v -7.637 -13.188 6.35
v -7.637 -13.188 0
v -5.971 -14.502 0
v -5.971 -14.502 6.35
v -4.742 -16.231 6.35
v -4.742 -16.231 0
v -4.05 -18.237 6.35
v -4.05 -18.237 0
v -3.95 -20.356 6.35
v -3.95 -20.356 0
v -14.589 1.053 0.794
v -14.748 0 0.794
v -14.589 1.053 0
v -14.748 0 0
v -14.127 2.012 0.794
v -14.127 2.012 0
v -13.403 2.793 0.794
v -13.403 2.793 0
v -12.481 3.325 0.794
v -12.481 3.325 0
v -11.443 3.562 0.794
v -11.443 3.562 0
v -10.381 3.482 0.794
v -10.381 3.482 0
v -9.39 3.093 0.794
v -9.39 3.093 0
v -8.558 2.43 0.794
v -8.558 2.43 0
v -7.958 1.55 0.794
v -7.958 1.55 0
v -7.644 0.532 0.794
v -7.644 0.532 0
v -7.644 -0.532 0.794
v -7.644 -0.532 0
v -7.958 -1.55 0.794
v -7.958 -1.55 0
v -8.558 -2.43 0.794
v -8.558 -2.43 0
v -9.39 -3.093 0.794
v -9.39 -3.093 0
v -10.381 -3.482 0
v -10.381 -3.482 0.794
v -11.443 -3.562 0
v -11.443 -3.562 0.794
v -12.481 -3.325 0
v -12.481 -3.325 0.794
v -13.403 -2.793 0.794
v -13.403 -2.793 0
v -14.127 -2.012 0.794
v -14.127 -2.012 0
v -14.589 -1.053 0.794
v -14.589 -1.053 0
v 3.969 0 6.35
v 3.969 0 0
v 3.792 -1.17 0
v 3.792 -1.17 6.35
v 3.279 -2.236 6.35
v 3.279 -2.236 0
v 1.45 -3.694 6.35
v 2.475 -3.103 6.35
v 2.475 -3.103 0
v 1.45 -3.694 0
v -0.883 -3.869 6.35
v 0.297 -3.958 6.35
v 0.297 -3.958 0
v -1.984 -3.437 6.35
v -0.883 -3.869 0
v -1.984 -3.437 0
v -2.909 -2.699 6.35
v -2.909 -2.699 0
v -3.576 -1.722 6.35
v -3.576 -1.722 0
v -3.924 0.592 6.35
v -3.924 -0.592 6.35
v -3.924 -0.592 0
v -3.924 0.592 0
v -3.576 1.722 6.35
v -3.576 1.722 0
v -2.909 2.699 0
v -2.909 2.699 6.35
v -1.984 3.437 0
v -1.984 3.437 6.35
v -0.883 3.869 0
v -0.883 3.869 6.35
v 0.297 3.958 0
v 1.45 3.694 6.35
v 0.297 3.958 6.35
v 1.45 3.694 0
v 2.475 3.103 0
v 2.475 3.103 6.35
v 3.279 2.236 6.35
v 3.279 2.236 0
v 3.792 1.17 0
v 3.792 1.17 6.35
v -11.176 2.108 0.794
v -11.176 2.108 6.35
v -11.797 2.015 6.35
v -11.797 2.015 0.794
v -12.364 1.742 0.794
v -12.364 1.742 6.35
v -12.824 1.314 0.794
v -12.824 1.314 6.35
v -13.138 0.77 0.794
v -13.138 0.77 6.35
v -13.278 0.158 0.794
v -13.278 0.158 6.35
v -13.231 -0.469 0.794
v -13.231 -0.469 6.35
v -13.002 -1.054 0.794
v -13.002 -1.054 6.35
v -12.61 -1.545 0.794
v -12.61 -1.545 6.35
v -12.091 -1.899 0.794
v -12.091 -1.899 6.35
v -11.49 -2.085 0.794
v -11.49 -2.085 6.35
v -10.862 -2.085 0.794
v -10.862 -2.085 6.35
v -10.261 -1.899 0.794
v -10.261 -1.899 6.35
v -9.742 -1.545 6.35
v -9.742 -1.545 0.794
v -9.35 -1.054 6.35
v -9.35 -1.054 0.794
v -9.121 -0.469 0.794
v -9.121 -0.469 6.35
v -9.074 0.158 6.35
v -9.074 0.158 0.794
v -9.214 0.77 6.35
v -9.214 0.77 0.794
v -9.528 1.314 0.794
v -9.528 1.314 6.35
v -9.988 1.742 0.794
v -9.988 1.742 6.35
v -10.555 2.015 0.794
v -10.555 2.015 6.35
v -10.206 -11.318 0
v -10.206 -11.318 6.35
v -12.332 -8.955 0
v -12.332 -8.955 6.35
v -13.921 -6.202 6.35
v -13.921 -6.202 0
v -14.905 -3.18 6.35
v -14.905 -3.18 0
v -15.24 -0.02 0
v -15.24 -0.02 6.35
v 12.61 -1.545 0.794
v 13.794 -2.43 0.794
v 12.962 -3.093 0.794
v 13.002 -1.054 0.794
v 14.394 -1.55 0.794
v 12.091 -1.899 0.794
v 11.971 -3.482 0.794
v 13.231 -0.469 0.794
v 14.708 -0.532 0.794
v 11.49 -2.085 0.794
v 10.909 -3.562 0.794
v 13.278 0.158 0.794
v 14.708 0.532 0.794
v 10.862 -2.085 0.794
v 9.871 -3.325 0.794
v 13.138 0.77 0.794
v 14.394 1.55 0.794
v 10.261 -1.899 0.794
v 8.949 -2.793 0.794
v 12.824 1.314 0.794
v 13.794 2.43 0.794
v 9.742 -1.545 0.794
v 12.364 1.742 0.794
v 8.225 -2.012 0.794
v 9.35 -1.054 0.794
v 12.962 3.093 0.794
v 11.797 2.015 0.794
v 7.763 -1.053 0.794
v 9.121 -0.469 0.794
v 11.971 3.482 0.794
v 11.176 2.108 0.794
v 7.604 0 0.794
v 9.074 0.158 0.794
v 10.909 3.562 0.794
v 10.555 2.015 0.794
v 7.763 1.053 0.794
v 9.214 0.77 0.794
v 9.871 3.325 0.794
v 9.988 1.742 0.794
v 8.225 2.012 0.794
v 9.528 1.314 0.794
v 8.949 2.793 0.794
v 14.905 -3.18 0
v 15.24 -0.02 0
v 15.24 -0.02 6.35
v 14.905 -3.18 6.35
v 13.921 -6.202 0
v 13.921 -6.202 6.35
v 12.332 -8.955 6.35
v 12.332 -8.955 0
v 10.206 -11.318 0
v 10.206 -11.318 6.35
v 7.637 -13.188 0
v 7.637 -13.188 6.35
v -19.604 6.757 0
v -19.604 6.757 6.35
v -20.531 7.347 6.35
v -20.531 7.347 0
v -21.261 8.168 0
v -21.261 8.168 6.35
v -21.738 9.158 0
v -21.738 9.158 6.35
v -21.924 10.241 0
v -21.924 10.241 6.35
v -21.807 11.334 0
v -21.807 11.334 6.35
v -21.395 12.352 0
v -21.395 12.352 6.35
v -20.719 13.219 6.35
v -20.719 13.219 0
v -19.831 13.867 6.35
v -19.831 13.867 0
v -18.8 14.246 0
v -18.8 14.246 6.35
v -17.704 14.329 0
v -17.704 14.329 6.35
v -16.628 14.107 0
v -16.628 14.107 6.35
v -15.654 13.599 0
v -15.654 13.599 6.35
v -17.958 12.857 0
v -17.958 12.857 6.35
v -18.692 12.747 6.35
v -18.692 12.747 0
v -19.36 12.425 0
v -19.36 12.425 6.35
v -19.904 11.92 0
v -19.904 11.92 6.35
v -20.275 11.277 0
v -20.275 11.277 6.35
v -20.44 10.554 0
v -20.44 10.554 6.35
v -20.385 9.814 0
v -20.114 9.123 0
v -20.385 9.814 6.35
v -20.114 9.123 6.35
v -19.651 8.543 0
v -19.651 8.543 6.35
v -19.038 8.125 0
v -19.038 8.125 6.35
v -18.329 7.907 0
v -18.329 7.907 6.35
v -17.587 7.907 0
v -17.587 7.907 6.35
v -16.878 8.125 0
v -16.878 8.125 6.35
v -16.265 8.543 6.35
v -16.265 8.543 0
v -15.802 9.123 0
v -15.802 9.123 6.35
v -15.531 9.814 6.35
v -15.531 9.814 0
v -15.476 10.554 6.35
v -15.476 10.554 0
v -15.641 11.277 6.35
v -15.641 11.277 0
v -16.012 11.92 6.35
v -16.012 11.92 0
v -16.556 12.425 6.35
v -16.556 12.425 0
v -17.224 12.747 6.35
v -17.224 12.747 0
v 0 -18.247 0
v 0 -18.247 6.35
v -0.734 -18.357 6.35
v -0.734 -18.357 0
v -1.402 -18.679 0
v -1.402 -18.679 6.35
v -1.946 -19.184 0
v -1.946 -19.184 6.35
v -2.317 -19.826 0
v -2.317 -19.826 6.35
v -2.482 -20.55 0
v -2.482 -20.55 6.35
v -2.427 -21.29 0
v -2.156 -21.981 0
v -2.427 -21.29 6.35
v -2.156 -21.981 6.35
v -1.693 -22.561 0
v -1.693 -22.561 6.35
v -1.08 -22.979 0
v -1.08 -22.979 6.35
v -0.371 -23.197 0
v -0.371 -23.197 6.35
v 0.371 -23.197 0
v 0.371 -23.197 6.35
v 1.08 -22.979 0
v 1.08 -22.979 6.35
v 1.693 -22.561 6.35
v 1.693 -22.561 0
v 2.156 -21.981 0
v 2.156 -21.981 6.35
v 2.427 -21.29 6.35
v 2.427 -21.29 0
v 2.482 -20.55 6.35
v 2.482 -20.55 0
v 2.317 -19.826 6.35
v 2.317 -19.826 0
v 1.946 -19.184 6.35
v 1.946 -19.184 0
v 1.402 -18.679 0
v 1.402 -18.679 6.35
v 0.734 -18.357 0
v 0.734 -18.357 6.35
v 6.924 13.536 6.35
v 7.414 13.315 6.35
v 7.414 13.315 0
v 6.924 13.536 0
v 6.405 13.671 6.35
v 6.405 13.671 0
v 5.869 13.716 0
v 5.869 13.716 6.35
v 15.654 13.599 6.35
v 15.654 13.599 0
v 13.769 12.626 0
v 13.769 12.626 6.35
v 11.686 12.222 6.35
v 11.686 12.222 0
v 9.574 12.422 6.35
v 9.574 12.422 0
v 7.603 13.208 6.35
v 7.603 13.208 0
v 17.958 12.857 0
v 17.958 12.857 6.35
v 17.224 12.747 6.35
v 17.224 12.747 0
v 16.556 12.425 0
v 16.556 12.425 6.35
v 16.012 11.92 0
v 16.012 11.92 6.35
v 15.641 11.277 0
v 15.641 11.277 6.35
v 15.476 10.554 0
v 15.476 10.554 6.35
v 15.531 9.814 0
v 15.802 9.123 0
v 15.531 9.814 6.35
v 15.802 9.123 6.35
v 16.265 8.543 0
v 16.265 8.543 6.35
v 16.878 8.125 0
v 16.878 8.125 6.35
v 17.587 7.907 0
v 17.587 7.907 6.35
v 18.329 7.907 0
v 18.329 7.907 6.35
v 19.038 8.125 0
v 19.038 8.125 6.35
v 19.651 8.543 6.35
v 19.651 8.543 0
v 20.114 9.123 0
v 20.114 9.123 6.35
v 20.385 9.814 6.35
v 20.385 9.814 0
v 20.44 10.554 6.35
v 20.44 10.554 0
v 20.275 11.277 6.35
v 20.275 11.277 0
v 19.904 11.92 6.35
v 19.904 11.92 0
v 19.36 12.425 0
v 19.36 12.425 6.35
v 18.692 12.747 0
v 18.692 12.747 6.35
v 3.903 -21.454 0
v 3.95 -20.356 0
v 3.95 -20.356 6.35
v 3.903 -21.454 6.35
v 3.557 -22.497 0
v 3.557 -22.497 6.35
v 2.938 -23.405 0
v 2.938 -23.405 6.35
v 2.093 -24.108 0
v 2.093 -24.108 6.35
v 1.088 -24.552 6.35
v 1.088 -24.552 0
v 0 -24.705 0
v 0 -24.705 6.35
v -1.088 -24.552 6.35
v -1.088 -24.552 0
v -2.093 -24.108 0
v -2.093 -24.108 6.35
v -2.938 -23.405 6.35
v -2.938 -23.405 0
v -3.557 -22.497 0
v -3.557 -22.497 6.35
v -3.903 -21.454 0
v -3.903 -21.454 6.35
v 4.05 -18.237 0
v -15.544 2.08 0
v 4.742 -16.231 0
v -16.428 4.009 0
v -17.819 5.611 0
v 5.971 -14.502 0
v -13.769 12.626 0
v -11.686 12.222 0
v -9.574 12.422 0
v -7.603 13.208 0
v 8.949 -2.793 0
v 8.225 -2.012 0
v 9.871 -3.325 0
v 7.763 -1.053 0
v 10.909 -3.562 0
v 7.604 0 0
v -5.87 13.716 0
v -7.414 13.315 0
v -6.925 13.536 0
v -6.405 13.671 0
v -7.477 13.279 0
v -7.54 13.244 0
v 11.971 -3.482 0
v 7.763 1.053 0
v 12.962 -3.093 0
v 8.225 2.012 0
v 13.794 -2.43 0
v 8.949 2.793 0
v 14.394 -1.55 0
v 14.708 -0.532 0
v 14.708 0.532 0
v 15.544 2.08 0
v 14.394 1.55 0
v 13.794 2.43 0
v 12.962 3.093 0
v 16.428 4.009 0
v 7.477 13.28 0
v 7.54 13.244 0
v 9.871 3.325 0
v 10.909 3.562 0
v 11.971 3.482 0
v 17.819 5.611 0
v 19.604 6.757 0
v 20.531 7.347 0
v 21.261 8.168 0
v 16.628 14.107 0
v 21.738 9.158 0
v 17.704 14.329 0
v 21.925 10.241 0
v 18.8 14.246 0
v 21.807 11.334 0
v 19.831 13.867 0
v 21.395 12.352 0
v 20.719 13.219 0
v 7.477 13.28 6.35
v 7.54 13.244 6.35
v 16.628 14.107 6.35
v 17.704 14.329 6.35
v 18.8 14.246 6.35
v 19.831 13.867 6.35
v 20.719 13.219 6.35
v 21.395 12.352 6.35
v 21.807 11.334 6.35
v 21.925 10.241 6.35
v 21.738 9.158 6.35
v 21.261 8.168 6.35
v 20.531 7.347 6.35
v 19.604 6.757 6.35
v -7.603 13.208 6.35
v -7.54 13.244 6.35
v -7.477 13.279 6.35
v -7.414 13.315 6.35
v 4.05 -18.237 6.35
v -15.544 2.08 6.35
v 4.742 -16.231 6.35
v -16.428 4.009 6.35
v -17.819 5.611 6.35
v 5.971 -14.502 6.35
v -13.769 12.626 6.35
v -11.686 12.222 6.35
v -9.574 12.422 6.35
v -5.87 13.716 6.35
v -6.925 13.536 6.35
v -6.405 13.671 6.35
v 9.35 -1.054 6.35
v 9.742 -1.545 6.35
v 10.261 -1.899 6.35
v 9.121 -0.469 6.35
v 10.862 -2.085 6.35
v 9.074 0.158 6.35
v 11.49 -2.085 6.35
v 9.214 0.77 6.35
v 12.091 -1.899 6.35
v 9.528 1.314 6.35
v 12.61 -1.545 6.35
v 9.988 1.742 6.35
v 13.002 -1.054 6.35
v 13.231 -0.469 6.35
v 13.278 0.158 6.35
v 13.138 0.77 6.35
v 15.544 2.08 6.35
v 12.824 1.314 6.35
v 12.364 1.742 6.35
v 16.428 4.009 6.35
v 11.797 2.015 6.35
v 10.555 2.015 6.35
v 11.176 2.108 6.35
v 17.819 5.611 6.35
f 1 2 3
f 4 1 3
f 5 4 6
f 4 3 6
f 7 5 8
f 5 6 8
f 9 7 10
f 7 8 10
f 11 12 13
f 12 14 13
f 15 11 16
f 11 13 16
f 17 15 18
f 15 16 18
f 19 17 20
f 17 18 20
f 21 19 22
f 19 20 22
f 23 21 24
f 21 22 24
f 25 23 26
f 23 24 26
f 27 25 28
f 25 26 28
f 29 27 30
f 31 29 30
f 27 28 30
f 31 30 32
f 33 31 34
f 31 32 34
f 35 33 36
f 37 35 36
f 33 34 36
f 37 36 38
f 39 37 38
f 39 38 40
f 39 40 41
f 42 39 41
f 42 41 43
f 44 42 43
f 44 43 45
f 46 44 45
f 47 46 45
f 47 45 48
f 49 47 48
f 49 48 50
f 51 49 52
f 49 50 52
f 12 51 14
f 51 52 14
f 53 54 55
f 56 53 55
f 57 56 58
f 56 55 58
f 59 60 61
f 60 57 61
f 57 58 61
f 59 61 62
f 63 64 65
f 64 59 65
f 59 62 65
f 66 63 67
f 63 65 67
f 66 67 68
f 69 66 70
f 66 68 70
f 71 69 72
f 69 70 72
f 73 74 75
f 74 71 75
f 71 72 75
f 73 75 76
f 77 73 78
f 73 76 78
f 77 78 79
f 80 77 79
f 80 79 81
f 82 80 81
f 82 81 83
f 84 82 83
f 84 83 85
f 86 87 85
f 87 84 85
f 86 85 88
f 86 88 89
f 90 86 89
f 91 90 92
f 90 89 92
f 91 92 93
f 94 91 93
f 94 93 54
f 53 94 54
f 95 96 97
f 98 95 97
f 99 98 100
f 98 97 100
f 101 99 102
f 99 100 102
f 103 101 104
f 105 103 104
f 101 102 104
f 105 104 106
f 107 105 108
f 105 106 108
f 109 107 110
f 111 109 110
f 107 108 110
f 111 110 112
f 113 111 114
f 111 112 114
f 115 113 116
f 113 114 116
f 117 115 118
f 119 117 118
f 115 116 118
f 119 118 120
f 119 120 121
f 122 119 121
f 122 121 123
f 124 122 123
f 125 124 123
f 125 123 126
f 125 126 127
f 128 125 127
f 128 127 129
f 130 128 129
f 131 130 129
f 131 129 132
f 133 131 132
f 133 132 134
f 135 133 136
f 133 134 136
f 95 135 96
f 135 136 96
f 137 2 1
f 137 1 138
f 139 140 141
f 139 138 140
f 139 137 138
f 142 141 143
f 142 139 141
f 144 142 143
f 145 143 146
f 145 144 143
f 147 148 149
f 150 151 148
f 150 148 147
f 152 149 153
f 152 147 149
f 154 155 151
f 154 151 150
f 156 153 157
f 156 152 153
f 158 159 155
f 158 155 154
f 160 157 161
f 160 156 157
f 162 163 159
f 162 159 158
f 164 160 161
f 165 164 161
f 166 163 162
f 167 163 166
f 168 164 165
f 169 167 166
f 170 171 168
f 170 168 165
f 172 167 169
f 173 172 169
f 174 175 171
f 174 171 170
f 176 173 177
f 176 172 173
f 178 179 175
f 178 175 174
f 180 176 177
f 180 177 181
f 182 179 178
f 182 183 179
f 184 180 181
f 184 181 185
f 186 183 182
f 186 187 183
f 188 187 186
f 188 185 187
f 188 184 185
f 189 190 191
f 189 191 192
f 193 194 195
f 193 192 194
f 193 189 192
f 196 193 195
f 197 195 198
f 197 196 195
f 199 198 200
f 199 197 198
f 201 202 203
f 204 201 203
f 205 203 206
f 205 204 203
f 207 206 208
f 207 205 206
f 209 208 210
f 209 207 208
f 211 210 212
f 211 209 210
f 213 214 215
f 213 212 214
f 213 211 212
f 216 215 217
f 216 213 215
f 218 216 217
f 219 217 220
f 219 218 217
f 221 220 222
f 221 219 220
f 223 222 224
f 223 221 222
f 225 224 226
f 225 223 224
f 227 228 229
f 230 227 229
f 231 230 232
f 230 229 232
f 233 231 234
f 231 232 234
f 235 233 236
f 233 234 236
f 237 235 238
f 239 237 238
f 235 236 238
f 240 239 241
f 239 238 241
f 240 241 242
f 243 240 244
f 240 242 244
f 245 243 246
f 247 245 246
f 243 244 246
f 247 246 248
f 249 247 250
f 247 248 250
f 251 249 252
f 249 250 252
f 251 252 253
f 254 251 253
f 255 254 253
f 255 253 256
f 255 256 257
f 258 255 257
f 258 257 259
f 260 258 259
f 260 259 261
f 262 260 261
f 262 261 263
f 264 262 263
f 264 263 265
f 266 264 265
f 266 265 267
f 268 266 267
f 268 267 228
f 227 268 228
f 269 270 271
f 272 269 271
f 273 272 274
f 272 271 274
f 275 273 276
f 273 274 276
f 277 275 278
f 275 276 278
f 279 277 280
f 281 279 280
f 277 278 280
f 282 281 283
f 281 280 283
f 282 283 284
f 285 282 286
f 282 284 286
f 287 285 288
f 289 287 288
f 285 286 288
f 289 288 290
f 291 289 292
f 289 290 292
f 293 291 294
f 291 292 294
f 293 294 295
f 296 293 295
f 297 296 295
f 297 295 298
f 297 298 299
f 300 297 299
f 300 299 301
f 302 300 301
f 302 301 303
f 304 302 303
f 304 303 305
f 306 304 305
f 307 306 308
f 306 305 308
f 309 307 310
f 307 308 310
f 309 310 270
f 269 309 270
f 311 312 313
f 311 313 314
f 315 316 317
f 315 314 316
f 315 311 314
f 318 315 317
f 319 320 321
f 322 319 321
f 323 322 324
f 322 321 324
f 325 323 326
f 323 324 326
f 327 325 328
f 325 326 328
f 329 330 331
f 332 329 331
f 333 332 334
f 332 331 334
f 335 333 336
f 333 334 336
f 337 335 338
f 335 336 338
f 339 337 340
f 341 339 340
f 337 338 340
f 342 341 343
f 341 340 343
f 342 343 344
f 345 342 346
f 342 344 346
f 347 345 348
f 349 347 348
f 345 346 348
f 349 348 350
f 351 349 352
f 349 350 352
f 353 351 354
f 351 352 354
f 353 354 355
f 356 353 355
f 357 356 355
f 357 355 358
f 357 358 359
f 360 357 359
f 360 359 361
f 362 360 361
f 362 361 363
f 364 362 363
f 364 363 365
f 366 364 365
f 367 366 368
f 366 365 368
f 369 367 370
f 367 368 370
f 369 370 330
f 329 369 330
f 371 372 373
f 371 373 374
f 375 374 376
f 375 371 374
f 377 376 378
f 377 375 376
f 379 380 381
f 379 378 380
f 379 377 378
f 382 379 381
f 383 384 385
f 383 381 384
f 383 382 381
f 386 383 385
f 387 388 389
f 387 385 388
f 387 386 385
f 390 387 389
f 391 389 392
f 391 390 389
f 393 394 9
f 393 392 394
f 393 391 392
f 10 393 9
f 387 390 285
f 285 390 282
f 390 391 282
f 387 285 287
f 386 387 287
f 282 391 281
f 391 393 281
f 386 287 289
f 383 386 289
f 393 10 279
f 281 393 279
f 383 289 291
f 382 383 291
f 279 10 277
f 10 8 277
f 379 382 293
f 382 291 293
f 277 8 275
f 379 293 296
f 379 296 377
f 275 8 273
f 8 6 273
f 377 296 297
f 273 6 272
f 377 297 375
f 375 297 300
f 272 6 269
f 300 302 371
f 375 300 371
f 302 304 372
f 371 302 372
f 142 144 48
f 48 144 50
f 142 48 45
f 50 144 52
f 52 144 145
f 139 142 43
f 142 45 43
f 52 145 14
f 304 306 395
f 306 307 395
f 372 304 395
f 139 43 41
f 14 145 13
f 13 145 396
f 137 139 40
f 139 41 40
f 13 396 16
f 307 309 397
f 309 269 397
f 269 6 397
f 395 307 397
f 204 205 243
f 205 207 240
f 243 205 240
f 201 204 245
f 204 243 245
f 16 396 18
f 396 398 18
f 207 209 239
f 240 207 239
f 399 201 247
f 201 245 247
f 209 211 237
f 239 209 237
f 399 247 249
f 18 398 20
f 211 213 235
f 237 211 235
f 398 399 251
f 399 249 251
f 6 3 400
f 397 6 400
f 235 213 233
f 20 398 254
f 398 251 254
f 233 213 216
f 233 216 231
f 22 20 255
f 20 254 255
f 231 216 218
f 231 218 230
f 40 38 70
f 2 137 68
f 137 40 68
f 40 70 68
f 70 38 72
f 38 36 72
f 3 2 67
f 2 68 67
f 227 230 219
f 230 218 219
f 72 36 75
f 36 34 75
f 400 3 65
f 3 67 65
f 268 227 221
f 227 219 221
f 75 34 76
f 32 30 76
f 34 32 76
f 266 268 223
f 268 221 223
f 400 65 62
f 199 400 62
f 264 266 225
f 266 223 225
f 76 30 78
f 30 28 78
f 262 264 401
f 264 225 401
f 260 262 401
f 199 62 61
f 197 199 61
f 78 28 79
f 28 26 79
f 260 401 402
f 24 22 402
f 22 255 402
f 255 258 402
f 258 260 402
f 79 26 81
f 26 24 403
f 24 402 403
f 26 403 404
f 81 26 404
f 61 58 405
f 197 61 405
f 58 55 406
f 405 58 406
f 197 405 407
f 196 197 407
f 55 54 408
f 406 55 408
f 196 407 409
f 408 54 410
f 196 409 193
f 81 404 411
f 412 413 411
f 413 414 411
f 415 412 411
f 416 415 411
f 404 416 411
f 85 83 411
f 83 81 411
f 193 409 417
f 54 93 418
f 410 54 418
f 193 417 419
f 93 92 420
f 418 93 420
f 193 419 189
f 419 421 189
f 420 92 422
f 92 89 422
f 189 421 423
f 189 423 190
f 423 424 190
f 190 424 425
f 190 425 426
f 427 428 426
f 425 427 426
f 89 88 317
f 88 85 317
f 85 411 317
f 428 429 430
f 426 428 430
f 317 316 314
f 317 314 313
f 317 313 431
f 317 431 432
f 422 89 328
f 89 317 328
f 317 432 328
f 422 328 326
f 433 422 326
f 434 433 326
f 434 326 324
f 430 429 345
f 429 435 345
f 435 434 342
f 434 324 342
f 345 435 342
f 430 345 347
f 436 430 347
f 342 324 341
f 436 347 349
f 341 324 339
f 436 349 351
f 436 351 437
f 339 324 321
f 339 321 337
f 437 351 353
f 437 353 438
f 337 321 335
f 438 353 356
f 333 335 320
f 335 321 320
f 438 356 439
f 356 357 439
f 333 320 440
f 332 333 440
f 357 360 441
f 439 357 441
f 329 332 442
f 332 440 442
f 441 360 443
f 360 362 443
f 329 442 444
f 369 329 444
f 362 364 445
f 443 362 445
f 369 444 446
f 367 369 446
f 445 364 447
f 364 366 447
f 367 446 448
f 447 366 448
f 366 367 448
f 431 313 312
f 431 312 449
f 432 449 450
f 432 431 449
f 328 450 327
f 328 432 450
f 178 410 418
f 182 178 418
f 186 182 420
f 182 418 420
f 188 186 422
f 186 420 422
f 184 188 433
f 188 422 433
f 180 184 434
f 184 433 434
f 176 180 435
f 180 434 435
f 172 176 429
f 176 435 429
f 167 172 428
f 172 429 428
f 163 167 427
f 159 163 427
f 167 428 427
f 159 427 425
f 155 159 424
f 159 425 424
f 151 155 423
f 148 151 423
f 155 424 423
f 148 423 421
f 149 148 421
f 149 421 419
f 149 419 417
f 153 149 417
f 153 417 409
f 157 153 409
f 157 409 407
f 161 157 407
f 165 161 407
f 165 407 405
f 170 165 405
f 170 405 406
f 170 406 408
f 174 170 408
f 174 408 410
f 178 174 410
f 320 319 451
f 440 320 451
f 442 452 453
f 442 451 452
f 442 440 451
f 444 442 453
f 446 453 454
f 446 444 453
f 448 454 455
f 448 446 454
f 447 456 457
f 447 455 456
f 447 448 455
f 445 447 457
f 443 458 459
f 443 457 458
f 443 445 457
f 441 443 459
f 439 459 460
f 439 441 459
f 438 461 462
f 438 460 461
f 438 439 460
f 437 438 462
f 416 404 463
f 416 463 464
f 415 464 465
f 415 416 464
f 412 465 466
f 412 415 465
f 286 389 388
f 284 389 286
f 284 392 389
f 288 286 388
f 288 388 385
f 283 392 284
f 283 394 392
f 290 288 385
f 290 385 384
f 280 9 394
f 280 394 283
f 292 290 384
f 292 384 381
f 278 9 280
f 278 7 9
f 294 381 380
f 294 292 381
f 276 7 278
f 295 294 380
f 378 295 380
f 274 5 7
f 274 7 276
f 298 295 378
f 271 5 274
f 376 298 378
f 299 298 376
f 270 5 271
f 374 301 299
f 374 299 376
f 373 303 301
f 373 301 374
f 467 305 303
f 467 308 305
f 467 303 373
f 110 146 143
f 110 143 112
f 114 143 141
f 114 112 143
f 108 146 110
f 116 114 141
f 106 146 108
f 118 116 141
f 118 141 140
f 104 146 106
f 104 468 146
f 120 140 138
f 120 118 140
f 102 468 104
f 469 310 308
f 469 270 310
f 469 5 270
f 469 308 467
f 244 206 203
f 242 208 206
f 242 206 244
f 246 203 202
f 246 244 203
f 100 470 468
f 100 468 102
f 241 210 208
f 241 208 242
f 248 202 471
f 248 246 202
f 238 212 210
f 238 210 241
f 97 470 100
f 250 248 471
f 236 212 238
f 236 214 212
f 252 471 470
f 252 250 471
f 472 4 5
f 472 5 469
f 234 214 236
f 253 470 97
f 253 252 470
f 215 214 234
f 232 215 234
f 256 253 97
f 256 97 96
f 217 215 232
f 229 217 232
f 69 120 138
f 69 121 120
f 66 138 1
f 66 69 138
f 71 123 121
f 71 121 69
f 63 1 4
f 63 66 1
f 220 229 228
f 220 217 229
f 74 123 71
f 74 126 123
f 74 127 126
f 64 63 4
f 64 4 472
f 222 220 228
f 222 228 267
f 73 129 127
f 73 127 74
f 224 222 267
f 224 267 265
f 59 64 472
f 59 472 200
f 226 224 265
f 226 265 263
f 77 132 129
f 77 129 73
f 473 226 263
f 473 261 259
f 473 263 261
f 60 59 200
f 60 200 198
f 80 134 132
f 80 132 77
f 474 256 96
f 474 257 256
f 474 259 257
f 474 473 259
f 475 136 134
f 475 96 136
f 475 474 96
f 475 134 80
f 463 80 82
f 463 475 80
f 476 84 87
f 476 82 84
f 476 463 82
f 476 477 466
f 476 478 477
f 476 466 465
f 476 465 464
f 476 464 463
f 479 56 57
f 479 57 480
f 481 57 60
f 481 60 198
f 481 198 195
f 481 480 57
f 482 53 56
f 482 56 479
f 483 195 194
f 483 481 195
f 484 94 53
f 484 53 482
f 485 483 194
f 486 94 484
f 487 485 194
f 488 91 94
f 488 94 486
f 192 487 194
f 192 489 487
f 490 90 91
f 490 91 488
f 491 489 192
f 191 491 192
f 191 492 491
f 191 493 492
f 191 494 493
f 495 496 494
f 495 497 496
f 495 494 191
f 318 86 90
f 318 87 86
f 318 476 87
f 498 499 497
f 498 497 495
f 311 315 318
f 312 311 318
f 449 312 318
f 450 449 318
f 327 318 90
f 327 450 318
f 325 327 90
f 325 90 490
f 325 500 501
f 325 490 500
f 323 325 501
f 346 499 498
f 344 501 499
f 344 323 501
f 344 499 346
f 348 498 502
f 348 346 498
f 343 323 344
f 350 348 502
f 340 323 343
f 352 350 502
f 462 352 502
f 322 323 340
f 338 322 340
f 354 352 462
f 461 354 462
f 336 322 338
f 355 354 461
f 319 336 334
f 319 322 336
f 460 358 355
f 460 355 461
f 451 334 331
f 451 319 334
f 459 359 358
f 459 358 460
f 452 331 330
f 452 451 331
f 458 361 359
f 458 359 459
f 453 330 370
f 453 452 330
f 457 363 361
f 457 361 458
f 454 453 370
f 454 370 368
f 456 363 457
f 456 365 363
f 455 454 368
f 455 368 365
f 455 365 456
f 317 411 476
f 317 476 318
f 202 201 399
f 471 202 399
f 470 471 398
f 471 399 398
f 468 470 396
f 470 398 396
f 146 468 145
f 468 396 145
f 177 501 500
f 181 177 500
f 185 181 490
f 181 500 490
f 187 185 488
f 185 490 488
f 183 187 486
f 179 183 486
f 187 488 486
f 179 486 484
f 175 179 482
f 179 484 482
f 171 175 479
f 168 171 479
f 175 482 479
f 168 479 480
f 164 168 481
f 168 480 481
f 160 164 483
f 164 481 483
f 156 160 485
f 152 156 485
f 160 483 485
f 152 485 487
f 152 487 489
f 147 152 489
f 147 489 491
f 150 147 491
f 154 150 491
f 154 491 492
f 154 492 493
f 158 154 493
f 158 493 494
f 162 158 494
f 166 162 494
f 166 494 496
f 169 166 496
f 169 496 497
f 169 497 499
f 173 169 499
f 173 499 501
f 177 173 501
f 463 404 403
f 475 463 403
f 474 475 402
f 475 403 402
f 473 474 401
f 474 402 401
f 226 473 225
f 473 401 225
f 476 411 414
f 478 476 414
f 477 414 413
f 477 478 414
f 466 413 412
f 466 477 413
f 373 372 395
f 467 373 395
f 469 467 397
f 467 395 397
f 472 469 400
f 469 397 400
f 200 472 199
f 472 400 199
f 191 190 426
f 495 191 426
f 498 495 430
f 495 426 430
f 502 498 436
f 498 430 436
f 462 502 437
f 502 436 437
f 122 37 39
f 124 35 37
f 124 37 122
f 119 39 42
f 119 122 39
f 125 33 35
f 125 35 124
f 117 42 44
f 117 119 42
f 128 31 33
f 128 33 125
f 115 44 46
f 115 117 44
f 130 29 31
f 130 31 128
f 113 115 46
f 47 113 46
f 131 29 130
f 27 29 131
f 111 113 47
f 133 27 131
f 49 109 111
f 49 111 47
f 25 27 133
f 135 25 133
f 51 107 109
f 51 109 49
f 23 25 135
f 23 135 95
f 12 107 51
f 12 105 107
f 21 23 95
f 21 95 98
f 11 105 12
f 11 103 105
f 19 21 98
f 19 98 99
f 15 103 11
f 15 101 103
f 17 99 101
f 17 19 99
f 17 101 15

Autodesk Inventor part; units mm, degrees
ref_plane "YZ Plane" through (0, 0, 0) normal (1, 0, 0) x (0, 1, 0)
ref_plane "XZ Plane" through (0, 0, 0) normal (0, 1, 0) x (-1, 0, 0)
ref_plane "XY Plane" through (0, 0, 0) normal (0, 0, 1) x (1, 0, 0)
sketch "Sketch1" plane through (0, 0, 0) normal (0, 0, 1) x (1, 0, 0)
  circle A0 centre (0, 0) radius 20.7359 construction
  line L0 (0, 0) -> (-17.9578, 10.368) construction
  arc A1 (-19.6042, 6.7568) -> (-15.6537, 13.5993) centre (-17.9578, 10.368) ccw construction
  arc A2 (-7.603, 13.208) -> (-15.24, -0.0196) centre (0, 0) ccw construction
  arc A3 (-15.24, -0.0196) -> (-19.6042, 6.7568) centre (-22.698, -0.0292) ccw
  arc A4 (-15.6537, 13.5993) -> (-7.603, 13.208) centre (-11.3237, 19.6716) ccw
  line L1 (0, 0) -> (-20.7359, 0) construction
  arc A5 (-15.6537, 13.5993) -> (-19.6042, 6.7568) centre (-17.9578, 10.368) ccw
  arc A6 (-15.24, -0.0196) -> (-7.637, -13.1884) centre (0, 0) ccw
  arc A7 (7.637, -13.1884) -> (3.9505, -20.3561) centre (11.3743, -19.6424) ccw
  arc A8 (-3.9505, -20.3561) -> (-7.637, -13.1884) centre (-11.3743, -19.6424) ccw
  arc A9 (-3.9505, -20.3561) -> (3.9505, -20.3561) centre (0, -20.7359) ccw
  arc A10 (7.603, 13.208) -> (15.6537, 13.5993) centre (11.3237, 19.6716) ccw
  arc A11 (19.6042, 6.7568) -> (15.24, -0.0196) centre (22.698, -0.0292) ccw
  arc A12 (19.6042, 6.7568) -> (15.6537, 13.5993) centre (17.9578, 10.368) ccw
  arc A13 (7.603, 13.208) -> (6.643, 13.716) centre (0, 0) ccw
  arc A14 (7.637, -13.1884) -> (15.24, -0.0196) centre (0, 0) ccw
  arc A15 (-7.637, -13.1884) -> (7.637, -13.1884) centre (0, 0) ccw construction
  arc A16 (15.24, -0.0196) -> (7.603, 13.208) centre (0, 0) ccw construction
  circle A17 centre (0, 0) radius 3.9688
  circle A18 centre (0, 0) radius 11.176 construction
  line L2 (0, -20.7359) -> (0, 0) construction
  line L3 (0, 0) -> (11.176, 0) construction
  line L4 (-6.643, 13.716) -> (6.643, 13.716)
  arc A19 (-6.643, 13.716) -> (-7.603, 13.208) centre (0, 0) ccw
  arc A20 (6.643, 13.716) -> (-6.643, 13.716) centre (0, 0) ccw construction
  point P0 (-11.176, 0)
  dimension "d0" = 41.4719
  dimension "d3" = 7.9375
  dimension "d5" = 30
  dimension "d9" = 360
  dimension "d20" = 7.9375
  dimension "d21" = 22.352
  dimension "d22" = 15.24
  dimension "d23" = 13.716
extrude "Extrusion1" add sketch "Sketch1" along normal blind 6.35
hole "Hole1" at (-17.9578, 10.368, 0) at (17.9578, 10.368, 0) at (0, -20.7359, 0) direction (0, 0, 1) diameter 4.9784 end through all clearance for "Socket Head Cap Screw" size "#10" standard "Ansi Unified Screw Threads"
hole "Hole2" at (-11.176, 0, 0) at (11.176, 0, 0) direction (0, 0, 1) diameter 4.2164 end through all
fillet "Fillet1" radius 3.175 2 edges at (-6.643, 13.716, 3.175) (6.643, 13.716, 3.175)
sketch "Sketch2" plane through (0, 0, 0) normal (0, 0, -1) x (-1, 0, 0)
  circle A0 centre (11.176, 0) radius 2.1082 projected
  circle A1 centre (-11.176, 0) radius 2.1082 projected
  circle A2 centre (-11.176, 0) radius 3.5719
  circle A3 centre (11.176, 0) radius 3.5719
  dimension "d32" = 7.1437
  dimension "d33" = 7.1437
extrude "Extrusion2" cut sketch "Sketch2" against normal blind 0.7937
properties part number "Pnuematic Plate" material "Aluminum 6061"
